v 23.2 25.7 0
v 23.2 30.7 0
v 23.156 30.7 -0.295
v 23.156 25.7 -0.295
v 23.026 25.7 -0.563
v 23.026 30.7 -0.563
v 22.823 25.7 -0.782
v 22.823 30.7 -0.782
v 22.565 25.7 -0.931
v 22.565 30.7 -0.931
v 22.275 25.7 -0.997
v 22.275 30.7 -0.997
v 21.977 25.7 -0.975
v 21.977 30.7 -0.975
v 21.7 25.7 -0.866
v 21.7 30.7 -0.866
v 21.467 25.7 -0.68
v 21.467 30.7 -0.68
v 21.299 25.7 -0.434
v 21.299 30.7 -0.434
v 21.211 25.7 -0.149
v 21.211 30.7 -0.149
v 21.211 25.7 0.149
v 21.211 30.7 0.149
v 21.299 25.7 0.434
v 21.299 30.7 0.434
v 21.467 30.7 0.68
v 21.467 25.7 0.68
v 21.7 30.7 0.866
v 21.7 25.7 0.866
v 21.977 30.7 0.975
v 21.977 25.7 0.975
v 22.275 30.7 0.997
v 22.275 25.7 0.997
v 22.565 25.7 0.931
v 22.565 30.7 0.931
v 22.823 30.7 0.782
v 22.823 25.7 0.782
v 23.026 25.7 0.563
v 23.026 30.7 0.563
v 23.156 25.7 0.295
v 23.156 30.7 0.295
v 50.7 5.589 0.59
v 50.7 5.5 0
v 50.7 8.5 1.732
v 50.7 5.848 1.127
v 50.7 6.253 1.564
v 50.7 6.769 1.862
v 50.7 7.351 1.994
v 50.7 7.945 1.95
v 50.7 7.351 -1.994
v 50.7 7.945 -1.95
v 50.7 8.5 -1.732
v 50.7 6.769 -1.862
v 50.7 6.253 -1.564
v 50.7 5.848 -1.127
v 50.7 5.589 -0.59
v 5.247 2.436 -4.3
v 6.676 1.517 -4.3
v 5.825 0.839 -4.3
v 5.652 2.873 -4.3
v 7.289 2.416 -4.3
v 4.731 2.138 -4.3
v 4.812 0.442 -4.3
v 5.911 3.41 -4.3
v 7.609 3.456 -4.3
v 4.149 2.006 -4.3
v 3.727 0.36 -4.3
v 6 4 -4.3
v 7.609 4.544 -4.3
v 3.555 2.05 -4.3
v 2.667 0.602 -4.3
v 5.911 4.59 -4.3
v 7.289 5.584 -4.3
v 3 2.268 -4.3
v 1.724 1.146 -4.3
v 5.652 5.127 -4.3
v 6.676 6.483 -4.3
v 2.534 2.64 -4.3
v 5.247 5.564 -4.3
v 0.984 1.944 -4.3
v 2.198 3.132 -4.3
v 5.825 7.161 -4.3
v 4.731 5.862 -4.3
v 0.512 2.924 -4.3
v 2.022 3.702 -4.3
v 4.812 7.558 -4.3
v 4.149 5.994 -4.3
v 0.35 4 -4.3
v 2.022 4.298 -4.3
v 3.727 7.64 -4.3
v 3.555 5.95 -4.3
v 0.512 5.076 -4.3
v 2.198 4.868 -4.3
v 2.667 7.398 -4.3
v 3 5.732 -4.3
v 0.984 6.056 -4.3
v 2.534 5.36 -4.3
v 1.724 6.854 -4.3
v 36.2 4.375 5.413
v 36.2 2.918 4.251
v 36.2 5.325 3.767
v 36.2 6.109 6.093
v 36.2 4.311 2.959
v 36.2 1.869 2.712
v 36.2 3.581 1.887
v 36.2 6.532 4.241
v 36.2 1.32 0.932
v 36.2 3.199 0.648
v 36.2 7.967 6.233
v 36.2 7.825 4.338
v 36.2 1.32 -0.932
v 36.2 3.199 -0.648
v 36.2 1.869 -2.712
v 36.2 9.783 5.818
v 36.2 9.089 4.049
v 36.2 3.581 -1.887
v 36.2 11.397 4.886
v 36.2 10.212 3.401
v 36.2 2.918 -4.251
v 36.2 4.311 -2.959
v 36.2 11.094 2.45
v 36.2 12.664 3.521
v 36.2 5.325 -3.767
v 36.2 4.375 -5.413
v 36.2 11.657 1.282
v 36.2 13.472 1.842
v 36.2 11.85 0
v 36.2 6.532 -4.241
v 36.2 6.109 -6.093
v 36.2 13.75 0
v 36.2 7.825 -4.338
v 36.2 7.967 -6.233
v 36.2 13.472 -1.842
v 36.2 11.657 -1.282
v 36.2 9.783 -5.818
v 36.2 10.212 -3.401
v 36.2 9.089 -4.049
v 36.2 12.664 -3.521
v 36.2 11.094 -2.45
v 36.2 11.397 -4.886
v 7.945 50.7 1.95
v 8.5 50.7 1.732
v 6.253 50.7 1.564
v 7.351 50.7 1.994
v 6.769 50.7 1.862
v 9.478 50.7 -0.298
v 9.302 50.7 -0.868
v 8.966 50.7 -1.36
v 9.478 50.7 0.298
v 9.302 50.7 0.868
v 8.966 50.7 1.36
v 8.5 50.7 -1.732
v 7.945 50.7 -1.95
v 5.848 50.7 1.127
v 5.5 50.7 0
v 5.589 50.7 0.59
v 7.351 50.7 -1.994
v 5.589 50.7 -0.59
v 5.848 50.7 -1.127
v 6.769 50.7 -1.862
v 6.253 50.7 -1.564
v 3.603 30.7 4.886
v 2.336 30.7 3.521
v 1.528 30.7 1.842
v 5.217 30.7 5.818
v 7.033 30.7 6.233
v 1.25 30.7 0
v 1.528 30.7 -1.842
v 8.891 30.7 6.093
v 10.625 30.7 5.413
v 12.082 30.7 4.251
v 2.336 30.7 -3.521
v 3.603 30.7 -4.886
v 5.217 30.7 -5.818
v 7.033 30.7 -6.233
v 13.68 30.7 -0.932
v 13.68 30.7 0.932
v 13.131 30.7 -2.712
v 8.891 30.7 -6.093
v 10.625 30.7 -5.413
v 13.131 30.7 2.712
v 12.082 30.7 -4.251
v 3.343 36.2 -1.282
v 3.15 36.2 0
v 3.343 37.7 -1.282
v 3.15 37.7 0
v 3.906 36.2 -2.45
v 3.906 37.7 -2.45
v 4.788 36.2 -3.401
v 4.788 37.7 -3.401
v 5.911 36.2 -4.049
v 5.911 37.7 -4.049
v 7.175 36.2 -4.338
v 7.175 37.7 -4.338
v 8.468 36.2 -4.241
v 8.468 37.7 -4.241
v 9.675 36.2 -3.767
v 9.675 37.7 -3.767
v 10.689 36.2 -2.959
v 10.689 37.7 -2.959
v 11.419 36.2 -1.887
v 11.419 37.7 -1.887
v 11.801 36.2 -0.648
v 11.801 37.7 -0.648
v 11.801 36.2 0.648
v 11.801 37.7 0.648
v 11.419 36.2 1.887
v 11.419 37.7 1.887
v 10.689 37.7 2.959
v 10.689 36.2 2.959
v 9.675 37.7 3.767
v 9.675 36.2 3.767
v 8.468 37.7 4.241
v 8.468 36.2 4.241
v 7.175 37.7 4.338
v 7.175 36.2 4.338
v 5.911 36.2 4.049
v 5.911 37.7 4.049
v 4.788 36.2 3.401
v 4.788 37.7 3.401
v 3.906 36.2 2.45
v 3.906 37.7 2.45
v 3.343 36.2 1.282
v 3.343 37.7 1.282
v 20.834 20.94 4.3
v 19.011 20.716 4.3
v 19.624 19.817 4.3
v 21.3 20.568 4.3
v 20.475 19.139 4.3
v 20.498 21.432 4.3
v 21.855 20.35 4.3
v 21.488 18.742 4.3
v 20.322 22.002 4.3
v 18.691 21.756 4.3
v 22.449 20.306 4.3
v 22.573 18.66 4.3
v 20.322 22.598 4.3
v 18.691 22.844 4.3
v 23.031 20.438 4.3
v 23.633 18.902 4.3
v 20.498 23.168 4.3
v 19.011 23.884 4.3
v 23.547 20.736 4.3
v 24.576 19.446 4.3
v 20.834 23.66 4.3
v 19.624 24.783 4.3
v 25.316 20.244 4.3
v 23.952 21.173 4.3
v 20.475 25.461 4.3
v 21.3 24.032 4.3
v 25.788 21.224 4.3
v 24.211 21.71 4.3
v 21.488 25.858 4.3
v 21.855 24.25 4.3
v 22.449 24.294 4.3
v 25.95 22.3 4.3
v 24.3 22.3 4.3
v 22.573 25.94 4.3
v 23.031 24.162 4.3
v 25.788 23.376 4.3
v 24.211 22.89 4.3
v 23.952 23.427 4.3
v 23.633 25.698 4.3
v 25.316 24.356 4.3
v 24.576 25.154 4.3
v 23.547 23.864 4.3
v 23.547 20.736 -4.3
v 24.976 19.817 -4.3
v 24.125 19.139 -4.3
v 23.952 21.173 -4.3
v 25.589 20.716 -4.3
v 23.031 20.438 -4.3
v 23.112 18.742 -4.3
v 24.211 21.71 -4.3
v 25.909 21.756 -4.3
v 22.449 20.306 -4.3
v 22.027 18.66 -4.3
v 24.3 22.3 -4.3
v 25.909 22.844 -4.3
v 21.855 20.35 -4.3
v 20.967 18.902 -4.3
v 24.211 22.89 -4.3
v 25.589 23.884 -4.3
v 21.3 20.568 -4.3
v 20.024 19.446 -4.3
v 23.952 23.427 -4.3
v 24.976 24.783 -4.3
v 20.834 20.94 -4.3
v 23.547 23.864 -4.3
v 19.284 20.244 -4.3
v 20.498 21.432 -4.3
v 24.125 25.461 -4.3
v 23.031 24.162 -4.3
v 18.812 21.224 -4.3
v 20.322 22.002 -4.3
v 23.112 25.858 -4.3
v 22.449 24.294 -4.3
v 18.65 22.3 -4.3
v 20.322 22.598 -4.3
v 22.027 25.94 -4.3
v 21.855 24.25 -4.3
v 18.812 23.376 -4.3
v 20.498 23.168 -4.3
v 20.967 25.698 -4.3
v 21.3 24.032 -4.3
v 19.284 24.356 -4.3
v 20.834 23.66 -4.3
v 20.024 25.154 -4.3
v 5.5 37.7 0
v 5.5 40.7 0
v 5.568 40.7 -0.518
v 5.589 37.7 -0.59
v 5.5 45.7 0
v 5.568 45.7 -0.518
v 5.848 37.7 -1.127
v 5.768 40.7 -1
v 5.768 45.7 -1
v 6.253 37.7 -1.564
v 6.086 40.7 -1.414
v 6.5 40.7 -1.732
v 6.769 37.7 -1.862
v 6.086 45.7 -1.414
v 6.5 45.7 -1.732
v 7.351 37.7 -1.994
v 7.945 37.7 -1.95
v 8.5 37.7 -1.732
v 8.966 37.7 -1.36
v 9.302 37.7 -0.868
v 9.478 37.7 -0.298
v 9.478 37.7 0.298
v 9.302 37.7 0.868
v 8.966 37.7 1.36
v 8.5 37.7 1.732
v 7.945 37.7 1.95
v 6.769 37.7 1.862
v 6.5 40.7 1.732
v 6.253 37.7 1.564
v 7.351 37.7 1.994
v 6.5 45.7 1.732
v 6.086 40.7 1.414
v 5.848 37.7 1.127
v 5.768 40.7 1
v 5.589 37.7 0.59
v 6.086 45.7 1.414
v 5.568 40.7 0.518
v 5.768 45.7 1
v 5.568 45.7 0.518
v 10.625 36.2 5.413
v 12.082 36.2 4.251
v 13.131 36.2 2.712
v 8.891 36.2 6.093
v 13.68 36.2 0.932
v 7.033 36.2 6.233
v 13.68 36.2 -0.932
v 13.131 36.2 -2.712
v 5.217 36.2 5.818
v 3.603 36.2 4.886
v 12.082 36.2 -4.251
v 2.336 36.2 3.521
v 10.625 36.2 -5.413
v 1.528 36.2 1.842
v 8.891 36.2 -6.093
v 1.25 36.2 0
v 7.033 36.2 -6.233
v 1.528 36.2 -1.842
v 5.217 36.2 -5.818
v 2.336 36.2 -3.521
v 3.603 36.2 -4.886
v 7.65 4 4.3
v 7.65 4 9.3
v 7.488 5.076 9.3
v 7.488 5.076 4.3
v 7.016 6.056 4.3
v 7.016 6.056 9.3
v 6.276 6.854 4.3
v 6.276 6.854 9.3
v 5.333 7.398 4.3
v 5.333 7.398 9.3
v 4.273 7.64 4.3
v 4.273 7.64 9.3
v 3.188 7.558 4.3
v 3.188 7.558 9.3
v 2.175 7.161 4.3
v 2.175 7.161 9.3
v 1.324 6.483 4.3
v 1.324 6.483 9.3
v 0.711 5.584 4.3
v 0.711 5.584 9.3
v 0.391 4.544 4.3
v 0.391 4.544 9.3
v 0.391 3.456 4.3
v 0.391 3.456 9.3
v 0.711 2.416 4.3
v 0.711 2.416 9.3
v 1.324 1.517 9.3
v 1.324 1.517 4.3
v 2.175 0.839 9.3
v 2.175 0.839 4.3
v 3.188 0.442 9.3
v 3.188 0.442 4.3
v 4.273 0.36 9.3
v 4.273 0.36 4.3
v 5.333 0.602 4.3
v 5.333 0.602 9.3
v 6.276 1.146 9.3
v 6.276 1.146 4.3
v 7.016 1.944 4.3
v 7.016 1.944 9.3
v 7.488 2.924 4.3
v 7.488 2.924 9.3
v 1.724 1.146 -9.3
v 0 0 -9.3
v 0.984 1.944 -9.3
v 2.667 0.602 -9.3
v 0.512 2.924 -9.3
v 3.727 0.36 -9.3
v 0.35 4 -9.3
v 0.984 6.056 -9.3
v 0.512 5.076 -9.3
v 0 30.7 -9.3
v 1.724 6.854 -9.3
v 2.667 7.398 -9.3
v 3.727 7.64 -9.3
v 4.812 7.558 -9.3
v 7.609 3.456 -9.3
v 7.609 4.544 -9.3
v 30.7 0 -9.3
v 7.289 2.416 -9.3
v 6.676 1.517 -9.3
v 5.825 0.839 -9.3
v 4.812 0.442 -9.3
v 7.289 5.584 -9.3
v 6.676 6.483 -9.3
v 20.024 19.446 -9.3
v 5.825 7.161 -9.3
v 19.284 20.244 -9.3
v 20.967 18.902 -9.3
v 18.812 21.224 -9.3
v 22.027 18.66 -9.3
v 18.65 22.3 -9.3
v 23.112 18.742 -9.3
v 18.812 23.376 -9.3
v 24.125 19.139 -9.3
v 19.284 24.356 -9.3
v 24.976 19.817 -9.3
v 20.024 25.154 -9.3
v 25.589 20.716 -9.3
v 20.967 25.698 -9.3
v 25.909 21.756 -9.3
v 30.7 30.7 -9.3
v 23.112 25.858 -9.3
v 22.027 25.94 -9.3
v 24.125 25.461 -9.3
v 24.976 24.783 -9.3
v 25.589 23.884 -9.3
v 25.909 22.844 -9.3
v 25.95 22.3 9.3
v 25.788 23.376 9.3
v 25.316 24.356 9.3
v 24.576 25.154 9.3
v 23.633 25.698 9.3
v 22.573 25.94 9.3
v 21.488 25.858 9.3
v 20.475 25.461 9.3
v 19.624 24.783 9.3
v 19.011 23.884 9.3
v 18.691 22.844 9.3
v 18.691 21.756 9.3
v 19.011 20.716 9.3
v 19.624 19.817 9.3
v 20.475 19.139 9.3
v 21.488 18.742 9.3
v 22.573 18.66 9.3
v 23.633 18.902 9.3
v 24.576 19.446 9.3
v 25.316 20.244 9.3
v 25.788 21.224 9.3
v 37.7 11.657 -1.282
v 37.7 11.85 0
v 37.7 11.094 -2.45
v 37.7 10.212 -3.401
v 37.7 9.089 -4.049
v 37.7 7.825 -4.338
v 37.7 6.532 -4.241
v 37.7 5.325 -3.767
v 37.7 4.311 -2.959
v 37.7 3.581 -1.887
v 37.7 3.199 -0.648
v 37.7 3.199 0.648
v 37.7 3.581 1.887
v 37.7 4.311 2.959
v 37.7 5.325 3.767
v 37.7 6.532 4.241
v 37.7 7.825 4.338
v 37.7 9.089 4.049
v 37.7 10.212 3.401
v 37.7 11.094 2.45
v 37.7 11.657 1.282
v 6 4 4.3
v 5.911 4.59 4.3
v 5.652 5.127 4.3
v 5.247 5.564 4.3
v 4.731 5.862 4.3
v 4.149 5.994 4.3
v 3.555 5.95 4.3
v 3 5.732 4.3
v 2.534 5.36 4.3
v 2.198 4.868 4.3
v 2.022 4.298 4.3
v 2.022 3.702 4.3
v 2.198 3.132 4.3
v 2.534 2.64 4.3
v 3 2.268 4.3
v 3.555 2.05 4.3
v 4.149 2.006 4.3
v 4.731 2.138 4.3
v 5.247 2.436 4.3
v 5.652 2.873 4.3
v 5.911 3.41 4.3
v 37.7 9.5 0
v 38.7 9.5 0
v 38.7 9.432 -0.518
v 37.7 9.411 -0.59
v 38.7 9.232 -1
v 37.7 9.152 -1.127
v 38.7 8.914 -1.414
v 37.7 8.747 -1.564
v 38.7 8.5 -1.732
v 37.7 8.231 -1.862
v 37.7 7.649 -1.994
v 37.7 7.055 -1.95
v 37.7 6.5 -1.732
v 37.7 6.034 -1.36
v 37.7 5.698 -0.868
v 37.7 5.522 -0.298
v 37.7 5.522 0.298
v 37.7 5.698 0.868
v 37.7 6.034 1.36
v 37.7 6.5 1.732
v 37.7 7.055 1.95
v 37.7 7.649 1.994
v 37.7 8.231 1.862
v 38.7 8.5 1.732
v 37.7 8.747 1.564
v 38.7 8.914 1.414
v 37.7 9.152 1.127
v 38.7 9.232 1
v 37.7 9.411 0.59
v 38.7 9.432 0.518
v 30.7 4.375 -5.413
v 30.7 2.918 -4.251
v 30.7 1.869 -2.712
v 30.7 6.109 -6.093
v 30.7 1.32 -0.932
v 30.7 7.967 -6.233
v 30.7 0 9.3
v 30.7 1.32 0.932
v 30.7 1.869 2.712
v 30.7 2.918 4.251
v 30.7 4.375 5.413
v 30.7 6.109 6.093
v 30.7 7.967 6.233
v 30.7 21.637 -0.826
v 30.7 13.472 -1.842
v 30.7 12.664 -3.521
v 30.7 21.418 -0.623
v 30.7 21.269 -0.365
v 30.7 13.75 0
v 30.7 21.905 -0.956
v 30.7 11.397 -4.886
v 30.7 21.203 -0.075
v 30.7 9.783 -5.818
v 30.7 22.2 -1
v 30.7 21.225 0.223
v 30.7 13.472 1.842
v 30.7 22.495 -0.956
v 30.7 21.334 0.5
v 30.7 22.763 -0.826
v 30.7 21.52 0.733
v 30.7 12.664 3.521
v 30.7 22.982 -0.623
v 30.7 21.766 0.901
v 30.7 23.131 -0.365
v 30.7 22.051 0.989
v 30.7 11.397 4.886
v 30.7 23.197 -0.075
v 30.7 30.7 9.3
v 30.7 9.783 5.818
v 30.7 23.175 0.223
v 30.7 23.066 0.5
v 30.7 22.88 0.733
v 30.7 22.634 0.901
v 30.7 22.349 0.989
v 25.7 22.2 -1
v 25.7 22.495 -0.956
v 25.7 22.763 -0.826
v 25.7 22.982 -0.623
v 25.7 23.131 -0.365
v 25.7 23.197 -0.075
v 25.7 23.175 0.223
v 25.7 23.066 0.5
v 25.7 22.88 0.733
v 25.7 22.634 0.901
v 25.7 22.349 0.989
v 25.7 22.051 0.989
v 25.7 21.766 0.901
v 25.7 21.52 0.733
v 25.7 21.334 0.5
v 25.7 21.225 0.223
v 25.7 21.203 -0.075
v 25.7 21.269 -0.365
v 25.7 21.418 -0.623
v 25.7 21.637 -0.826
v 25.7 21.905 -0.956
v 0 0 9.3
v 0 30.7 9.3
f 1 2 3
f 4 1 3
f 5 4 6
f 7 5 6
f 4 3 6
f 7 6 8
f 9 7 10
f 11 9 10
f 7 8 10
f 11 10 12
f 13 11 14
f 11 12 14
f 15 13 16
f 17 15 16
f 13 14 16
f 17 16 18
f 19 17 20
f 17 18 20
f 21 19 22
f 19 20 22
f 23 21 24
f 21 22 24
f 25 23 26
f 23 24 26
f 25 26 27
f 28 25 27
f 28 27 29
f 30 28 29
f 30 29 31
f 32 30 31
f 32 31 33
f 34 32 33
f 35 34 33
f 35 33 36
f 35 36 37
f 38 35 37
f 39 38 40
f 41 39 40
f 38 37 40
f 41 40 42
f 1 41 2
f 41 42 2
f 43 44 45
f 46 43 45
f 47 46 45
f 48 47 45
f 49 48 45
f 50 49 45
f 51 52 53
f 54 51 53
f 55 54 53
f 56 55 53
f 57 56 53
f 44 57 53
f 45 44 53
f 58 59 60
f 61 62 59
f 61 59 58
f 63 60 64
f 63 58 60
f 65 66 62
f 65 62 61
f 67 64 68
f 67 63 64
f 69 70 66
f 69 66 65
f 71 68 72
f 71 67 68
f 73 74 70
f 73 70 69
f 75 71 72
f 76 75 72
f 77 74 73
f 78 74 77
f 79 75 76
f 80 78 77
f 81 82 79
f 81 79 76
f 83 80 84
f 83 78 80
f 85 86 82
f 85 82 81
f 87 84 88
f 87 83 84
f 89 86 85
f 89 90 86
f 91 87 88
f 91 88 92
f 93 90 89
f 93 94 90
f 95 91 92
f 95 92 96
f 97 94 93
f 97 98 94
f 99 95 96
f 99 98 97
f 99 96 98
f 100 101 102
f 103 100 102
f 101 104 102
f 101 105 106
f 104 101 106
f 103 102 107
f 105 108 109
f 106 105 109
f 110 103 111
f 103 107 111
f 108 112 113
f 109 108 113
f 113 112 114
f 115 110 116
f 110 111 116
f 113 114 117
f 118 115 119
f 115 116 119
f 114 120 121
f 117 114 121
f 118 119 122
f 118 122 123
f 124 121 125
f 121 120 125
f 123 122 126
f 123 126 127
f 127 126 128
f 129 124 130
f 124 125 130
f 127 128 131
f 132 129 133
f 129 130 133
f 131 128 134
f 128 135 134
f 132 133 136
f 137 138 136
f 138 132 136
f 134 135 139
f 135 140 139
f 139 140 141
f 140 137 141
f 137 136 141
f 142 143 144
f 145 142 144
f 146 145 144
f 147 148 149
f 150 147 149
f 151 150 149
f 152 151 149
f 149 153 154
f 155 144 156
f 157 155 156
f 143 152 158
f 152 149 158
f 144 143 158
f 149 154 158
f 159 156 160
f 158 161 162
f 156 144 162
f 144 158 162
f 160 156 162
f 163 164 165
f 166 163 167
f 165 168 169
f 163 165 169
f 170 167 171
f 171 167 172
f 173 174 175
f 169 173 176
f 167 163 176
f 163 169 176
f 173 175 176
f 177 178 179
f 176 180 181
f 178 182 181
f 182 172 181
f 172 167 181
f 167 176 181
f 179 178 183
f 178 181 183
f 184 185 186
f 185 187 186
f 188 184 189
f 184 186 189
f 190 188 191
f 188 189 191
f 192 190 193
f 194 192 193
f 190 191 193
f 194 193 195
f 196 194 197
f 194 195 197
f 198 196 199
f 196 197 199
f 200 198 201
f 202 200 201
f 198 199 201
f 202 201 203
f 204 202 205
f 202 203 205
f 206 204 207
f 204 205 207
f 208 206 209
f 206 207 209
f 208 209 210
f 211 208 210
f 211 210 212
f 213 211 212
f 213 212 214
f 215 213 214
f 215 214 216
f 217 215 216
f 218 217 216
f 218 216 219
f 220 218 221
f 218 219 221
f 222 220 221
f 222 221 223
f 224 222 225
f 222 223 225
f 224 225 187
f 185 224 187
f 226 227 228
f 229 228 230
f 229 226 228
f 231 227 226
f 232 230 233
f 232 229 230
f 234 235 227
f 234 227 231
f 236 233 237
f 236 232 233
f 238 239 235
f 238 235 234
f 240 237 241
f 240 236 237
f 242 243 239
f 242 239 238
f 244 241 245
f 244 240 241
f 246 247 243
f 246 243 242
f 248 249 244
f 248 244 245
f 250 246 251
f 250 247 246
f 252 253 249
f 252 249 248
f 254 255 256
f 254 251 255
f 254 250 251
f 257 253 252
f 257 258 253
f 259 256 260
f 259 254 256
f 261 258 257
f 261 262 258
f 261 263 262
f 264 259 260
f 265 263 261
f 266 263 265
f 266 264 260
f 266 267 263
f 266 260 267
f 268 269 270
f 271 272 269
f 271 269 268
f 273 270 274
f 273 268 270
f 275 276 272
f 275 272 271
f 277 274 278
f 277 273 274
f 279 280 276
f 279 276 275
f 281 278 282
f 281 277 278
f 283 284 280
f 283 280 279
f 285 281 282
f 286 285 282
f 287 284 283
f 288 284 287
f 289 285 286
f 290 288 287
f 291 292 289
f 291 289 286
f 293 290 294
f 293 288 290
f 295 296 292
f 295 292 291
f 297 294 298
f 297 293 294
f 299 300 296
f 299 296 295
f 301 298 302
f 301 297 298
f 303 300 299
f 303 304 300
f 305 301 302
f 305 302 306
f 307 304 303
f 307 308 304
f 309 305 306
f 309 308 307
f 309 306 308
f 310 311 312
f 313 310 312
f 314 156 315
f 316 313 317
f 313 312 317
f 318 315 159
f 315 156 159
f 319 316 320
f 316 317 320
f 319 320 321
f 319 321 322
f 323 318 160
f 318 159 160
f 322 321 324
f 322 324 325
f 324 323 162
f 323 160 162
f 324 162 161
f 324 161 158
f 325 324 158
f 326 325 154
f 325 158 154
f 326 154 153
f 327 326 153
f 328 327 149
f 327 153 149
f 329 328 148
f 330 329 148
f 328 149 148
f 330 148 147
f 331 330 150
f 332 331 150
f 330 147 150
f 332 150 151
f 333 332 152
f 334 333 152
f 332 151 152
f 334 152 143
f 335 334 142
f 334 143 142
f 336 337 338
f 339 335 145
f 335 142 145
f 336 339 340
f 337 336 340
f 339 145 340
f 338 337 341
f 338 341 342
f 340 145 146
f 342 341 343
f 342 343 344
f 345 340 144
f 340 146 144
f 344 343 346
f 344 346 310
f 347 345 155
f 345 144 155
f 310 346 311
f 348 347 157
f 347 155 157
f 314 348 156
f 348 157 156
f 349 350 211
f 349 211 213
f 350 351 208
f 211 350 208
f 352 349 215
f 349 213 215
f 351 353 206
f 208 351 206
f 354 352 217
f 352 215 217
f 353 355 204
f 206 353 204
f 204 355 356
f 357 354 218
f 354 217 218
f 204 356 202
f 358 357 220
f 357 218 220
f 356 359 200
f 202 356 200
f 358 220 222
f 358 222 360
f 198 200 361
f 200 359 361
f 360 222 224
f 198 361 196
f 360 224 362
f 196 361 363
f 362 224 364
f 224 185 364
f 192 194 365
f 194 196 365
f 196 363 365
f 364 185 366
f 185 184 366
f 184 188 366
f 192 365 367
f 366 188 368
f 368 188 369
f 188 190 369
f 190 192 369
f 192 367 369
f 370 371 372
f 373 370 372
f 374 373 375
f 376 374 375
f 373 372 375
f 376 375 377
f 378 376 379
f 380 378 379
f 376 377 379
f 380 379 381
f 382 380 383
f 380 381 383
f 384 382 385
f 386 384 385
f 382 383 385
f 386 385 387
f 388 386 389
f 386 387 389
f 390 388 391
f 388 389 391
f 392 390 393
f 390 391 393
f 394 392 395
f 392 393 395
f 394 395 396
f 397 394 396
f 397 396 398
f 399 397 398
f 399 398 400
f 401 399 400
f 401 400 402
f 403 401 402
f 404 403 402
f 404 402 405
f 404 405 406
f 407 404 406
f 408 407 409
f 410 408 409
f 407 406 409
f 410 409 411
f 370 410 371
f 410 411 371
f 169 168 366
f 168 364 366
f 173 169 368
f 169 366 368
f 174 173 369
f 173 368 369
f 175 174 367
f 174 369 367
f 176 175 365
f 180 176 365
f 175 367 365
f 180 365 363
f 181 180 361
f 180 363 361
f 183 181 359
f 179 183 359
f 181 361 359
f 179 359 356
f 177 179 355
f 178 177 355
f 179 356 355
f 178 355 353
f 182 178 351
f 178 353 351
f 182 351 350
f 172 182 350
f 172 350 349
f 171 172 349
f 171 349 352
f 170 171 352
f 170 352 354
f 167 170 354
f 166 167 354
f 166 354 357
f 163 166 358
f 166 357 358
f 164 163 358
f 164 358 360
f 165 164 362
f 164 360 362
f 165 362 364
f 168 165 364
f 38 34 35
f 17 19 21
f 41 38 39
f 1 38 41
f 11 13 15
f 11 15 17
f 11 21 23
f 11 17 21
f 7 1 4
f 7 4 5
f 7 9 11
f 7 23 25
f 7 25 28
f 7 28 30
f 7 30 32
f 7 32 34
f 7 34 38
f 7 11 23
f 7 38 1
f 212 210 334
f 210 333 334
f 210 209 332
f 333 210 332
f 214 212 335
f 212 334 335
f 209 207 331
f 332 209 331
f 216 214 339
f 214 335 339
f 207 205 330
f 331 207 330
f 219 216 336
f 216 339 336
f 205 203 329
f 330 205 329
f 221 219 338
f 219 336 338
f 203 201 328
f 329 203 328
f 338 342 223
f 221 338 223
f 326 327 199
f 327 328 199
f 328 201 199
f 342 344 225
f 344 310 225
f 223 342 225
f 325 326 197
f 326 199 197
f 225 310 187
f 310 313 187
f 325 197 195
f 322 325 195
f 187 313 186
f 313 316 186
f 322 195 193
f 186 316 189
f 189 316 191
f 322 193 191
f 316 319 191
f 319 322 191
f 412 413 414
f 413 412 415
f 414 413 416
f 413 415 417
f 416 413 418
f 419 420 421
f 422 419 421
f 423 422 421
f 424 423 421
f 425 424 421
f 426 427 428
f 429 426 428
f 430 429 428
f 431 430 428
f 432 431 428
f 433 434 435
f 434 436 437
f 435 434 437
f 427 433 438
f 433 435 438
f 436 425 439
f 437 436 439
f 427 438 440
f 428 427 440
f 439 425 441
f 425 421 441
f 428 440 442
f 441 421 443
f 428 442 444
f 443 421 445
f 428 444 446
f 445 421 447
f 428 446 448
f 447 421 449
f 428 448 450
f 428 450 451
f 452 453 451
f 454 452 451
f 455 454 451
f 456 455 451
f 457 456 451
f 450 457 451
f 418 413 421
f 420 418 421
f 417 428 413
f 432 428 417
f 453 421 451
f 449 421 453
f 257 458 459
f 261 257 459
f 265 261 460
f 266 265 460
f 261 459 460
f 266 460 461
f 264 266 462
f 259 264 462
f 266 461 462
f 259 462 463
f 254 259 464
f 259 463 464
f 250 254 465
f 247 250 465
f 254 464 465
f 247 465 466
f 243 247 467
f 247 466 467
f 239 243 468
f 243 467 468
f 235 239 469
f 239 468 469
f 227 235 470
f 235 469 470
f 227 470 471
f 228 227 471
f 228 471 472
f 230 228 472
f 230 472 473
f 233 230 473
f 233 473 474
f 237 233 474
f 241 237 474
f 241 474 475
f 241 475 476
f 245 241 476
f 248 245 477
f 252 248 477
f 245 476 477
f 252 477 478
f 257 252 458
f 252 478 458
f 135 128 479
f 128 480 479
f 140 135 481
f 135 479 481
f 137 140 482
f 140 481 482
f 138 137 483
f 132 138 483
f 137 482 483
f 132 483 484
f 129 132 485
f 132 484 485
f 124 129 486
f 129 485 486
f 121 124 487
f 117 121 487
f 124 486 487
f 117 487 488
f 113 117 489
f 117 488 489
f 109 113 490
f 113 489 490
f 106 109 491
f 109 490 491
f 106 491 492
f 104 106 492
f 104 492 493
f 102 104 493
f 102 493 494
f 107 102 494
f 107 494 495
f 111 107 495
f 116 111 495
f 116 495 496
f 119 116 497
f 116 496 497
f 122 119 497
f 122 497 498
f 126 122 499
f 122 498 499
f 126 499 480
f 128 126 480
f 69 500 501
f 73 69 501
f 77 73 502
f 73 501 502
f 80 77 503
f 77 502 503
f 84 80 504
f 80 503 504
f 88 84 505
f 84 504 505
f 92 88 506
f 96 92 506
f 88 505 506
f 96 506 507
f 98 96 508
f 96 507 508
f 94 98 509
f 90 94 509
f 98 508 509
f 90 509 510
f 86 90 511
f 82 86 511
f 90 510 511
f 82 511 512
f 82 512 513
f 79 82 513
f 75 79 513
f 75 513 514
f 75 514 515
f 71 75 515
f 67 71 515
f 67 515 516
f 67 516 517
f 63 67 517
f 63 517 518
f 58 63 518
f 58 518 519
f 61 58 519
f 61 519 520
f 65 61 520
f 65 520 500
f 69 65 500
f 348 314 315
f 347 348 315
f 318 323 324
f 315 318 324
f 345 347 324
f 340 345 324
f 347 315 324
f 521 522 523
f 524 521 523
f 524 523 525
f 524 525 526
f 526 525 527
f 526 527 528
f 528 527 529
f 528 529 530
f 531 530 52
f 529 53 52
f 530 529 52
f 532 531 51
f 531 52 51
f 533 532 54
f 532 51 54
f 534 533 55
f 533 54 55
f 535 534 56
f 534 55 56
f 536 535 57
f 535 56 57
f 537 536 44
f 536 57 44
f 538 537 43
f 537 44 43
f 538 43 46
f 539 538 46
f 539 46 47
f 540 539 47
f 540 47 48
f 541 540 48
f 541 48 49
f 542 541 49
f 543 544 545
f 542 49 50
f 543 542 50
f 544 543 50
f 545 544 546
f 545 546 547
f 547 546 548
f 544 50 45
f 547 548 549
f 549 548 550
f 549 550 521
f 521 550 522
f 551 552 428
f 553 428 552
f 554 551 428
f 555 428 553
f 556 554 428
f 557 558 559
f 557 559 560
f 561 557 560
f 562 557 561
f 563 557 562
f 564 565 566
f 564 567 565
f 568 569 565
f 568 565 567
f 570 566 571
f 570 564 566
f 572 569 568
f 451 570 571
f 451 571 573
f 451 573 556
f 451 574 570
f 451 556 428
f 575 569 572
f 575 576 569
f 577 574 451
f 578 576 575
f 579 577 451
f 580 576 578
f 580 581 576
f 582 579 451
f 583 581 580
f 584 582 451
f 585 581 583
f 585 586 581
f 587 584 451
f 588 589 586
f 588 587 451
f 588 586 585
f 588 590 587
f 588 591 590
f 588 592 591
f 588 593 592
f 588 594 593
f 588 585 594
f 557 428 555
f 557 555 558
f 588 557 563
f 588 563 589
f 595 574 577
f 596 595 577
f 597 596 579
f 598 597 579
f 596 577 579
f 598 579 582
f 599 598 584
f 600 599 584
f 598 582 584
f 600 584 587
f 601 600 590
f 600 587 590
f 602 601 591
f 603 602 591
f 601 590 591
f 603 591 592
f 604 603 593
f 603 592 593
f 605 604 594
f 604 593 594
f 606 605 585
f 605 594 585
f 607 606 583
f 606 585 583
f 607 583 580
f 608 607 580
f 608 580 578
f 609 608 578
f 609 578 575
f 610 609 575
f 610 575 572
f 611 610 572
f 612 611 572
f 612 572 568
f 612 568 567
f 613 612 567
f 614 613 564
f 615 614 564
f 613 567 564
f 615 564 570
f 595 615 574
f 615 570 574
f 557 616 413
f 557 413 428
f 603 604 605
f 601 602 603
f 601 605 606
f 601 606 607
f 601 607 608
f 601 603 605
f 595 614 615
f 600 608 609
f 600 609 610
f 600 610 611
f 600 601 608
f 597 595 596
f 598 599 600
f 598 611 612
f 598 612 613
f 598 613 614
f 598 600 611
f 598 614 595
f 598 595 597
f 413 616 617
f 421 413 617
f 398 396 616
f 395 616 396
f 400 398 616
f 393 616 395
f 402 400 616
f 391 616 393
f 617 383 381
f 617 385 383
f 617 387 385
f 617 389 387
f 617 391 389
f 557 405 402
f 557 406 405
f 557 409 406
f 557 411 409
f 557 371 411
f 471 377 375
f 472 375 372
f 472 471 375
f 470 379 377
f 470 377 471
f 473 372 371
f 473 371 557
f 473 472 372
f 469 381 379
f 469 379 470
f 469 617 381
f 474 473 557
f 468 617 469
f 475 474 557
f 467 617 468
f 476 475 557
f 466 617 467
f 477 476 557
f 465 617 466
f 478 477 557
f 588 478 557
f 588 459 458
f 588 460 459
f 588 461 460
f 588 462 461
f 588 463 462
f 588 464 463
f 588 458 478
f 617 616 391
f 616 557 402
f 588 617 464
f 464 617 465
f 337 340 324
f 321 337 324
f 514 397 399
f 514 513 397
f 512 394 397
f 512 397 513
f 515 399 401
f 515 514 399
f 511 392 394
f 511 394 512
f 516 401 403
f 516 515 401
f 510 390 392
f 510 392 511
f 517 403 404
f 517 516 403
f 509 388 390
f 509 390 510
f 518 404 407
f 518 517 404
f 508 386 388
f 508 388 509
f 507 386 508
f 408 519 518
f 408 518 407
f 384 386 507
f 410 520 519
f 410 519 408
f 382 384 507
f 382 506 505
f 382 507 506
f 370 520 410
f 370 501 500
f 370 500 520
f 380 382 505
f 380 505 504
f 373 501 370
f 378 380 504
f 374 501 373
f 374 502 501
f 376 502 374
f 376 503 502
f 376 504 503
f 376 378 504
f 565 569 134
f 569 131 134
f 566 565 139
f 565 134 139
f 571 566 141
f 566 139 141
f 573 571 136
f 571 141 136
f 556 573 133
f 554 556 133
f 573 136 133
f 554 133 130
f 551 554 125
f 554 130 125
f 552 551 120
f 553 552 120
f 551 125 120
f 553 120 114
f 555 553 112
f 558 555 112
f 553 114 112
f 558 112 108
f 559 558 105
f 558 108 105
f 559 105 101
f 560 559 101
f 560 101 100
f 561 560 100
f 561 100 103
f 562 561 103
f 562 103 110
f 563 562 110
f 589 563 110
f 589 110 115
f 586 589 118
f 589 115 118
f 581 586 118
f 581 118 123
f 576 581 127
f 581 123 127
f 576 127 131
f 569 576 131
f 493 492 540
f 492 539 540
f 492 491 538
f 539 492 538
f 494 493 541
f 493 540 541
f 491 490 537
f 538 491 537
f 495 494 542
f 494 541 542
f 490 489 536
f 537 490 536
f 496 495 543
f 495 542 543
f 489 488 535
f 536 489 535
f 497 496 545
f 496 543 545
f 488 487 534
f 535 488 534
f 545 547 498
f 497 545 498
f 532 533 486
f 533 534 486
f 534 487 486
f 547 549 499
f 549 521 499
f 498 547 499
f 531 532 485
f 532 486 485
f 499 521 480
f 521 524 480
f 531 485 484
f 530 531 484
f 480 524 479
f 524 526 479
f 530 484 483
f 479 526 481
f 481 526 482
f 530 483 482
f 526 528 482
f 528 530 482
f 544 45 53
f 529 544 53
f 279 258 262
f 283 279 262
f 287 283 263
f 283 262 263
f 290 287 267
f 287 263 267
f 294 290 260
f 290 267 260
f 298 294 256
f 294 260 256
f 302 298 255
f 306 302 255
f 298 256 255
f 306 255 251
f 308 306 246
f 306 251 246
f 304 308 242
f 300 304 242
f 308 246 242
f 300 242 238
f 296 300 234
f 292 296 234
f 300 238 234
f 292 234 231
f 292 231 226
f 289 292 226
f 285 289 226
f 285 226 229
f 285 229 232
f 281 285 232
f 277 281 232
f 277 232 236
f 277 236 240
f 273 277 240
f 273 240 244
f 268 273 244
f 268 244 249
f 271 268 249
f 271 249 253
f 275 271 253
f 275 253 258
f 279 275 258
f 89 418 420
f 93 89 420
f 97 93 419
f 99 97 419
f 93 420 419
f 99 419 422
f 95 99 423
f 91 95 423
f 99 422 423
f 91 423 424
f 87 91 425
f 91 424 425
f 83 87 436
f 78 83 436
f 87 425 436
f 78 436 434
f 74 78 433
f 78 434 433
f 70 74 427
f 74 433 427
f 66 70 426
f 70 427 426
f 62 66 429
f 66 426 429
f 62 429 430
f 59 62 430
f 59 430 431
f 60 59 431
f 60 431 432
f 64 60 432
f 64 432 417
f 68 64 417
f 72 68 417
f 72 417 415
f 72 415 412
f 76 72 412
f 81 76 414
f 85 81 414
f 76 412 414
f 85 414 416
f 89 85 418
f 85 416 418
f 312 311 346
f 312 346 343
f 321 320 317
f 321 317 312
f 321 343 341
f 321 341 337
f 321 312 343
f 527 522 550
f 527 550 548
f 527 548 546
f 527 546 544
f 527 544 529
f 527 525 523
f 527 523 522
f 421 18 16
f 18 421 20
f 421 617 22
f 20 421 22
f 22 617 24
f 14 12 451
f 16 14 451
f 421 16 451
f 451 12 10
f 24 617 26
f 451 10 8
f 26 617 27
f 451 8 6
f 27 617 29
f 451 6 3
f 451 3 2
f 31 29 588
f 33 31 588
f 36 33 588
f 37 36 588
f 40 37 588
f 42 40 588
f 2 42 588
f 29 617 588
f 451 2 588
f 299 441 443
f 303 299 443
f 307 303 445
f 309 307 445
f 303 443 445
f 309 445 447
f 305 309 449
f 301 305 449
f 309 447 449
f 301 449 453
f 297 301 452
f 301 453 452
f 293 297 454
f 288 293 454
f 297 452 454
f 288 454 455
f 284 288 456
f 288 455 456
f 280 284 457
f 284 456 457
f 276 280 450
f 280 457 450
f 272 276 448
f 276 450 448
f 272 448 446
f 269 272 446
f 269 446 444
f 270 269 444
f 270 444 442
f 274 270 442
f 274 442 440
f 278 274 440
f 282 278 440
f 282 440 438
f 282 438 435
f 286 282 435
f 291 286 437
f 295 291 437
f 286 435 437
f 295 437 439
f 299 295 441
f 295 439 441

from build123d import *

# Parameters (mm, degrees)
ESQUISSE1_W             = 30.7
ESQUISSE1_H             = 30.7
BOSS_EXTRU_1_DEPTH      = 9.3
ESQUISSE2_R             = 2
ENL_V_MAT_EXTRU_1_DEPTH = 19.6
ESQUISSE3_R             = 3.65
ENL_V_MAT_EXTRU_2_DEPTH = 5
ESQUISSE4_R             = 3.65
ENL_V_MAT_EXTRU_3_DEPTH = 5
ESQUISSE9_W             = 1
ESQUISSE9_H             = 4
ENL_V_MAT_EXTRU_4_DEPTH = 5
ESQUISSE10_W            = 4
ESQUISSE10_H            = 1
ENL_V_MAT_EXTRU_5_DEPTH = 12
ESQUISSE11_R            = 1
ENL_V_MAT_EXTRU_6_DEPTH = 5
ESQUISSE13_R            = 1
ENL_V_MAT_EXTRU_7_DEPTH = 5


with BuildPart() as part:
    # Esquisse1 → Boss.-Extru.1 (new body, symmetric)
    with BuildSketch(Plane.XY):
        with Locations((15.35, 15.35)):
            Rectangle(ESQUISSE1_W, ESQUISSE1_H)
    extrude(amount=BOSS_EXTRU_1_DEPTH, both=True)

    # Esquisse2 → Enlèv. mat.-Extru.1 (cut, through all)
    with BuildSketch(Plane.XY.offset(9.3)):
        with Locations((4, 4)):
            Circle(ESQUISSE2_R)
        with Locations((22.3, 22.3)):
            Circle(ESQUISSE2_R)
    extrude(amount=-ENL_V_MAT_EXTRU_1_DEPTH, mode=Mode.SUBTRACT)

    # Esquisse3 → Enlèv. mat.-Extru.2 (cut)
    with BuildSketch(Plane.XY.offset(9.3)):
        with Locations((4, 4)):
            Circle(ESQUISSE3_R)
        with Locations((22.3, 22.3)):
            Circle(ESQUISSE3_R)
    extrude(amount=-ENL_V_MAT_EXTRU_2_DEPTH, mode=Mode.SUBTRACT)

    # Esquisse4 → Enlèv. mat.-Extru.3 (cut)
    with BuildSketch(Plane(origin=(0, 0, -9.3), x_dir=(-1, 0, 0), z_dir=(0, 0, -1))):
        with Locations((-4, 4)):
            Circle(ESQUISSE4_R)
        with Locations((-22.3, 22.3)):
            Circle(ESQUISSE4_R)
    extrude(amount=-ENL_V_MAT_EXTRU_3_DEPTH, mode=Mode.SUBTRACT)

    # Esquisse6 → Révolution1 (revolve)
    with BuildSketch(Plane.XY):
        Polygon((30.7, 13.75), (36.2, 13.75), (36.2, 11.85), (37.7, 11.85), (37.7, 9.5), (50.7, 9.5), (50.7, 7.5), (30.7, 7.5), align=None)
    revolve(axis=Axis((50.7, 7.5, 0), (-1, 0, 0)))

    # Esquisse10 → Enlèv. mat.-Extru.5 (cut)
    with BuildSketch(Plane(origin=(50.7, 0, 0), x_dir=(0, 0, -1), z_dir=(1, 0, 0))):
        with Locations((0, 9)):
            Rectangle(ESQUISSE10_W, ESQUISSE10_H)
    extrude(amount=-ENL_V_MAT_EXTRU_5_DEPTH, mode=Mode.SUBTRACT)

    # Esquisse11 → Enlèv. mat.-Extru.6 (cut)
    with BuildSketch(Plane(origin=(30.7, 0, 0), x_dir=(0, 0, -1), z_dir=(1, 0, 0))):
        with Locations((0, 22.2)):
            Circle(ESQUISSE11_R)
    extrude(amount=-ENL_V_MAT_EXTRU_6_DEPTH, mode=Mode.SUBTRACT)

    # Esquisse13 → Enlèv. mat.-Extru.7 (cut)
    with BuildSketch(Plane(origin=(0, 30.7, 0), x_dir=(1, 0, 0), z_dir=(0, 1, 0))):
        with Locations((22.2, 0)):
            Circle(ESQUISSE13_R)
    extrude(amount=-ENL_V_MAT_EXTRU_7_DEPTH, mode=Mode.SUBTRACT)


with BuildPart() as body_2:
    # Esquisse8 → Révolution2 (revolve)
    with BuildSketch(Plane.XY):
        Polygon((1.25, 30.7), (1.25, 36.2), (3.15, 36.2), (3.15, 37.7), (5.5, 37.7), (5.5, 50.7), (7.5, 50.7), (7.5, 30.7), align=None)
    revolve(axis=Axis((7.5, 50.7, 0), (0, -1, 0)))

    # Esquisse9 → Enlèv. mat.-Extru.4 (cut)
    with BuildSketch(Plane(origin=(0, 45.7, 0), x_dir=(1, 0, 0), z_dir=(0, 1, 0))):
        with Locations((6, 0)):
            Rectangle(ESQUISSE9_W, ESQUISSE9_H)
    extrude(amount=-ENL_V_MAT_EXTRU_4_DEPTH, mode=Mode.SUBTRACT)


solid = Compound([part.part, body_2.part])
